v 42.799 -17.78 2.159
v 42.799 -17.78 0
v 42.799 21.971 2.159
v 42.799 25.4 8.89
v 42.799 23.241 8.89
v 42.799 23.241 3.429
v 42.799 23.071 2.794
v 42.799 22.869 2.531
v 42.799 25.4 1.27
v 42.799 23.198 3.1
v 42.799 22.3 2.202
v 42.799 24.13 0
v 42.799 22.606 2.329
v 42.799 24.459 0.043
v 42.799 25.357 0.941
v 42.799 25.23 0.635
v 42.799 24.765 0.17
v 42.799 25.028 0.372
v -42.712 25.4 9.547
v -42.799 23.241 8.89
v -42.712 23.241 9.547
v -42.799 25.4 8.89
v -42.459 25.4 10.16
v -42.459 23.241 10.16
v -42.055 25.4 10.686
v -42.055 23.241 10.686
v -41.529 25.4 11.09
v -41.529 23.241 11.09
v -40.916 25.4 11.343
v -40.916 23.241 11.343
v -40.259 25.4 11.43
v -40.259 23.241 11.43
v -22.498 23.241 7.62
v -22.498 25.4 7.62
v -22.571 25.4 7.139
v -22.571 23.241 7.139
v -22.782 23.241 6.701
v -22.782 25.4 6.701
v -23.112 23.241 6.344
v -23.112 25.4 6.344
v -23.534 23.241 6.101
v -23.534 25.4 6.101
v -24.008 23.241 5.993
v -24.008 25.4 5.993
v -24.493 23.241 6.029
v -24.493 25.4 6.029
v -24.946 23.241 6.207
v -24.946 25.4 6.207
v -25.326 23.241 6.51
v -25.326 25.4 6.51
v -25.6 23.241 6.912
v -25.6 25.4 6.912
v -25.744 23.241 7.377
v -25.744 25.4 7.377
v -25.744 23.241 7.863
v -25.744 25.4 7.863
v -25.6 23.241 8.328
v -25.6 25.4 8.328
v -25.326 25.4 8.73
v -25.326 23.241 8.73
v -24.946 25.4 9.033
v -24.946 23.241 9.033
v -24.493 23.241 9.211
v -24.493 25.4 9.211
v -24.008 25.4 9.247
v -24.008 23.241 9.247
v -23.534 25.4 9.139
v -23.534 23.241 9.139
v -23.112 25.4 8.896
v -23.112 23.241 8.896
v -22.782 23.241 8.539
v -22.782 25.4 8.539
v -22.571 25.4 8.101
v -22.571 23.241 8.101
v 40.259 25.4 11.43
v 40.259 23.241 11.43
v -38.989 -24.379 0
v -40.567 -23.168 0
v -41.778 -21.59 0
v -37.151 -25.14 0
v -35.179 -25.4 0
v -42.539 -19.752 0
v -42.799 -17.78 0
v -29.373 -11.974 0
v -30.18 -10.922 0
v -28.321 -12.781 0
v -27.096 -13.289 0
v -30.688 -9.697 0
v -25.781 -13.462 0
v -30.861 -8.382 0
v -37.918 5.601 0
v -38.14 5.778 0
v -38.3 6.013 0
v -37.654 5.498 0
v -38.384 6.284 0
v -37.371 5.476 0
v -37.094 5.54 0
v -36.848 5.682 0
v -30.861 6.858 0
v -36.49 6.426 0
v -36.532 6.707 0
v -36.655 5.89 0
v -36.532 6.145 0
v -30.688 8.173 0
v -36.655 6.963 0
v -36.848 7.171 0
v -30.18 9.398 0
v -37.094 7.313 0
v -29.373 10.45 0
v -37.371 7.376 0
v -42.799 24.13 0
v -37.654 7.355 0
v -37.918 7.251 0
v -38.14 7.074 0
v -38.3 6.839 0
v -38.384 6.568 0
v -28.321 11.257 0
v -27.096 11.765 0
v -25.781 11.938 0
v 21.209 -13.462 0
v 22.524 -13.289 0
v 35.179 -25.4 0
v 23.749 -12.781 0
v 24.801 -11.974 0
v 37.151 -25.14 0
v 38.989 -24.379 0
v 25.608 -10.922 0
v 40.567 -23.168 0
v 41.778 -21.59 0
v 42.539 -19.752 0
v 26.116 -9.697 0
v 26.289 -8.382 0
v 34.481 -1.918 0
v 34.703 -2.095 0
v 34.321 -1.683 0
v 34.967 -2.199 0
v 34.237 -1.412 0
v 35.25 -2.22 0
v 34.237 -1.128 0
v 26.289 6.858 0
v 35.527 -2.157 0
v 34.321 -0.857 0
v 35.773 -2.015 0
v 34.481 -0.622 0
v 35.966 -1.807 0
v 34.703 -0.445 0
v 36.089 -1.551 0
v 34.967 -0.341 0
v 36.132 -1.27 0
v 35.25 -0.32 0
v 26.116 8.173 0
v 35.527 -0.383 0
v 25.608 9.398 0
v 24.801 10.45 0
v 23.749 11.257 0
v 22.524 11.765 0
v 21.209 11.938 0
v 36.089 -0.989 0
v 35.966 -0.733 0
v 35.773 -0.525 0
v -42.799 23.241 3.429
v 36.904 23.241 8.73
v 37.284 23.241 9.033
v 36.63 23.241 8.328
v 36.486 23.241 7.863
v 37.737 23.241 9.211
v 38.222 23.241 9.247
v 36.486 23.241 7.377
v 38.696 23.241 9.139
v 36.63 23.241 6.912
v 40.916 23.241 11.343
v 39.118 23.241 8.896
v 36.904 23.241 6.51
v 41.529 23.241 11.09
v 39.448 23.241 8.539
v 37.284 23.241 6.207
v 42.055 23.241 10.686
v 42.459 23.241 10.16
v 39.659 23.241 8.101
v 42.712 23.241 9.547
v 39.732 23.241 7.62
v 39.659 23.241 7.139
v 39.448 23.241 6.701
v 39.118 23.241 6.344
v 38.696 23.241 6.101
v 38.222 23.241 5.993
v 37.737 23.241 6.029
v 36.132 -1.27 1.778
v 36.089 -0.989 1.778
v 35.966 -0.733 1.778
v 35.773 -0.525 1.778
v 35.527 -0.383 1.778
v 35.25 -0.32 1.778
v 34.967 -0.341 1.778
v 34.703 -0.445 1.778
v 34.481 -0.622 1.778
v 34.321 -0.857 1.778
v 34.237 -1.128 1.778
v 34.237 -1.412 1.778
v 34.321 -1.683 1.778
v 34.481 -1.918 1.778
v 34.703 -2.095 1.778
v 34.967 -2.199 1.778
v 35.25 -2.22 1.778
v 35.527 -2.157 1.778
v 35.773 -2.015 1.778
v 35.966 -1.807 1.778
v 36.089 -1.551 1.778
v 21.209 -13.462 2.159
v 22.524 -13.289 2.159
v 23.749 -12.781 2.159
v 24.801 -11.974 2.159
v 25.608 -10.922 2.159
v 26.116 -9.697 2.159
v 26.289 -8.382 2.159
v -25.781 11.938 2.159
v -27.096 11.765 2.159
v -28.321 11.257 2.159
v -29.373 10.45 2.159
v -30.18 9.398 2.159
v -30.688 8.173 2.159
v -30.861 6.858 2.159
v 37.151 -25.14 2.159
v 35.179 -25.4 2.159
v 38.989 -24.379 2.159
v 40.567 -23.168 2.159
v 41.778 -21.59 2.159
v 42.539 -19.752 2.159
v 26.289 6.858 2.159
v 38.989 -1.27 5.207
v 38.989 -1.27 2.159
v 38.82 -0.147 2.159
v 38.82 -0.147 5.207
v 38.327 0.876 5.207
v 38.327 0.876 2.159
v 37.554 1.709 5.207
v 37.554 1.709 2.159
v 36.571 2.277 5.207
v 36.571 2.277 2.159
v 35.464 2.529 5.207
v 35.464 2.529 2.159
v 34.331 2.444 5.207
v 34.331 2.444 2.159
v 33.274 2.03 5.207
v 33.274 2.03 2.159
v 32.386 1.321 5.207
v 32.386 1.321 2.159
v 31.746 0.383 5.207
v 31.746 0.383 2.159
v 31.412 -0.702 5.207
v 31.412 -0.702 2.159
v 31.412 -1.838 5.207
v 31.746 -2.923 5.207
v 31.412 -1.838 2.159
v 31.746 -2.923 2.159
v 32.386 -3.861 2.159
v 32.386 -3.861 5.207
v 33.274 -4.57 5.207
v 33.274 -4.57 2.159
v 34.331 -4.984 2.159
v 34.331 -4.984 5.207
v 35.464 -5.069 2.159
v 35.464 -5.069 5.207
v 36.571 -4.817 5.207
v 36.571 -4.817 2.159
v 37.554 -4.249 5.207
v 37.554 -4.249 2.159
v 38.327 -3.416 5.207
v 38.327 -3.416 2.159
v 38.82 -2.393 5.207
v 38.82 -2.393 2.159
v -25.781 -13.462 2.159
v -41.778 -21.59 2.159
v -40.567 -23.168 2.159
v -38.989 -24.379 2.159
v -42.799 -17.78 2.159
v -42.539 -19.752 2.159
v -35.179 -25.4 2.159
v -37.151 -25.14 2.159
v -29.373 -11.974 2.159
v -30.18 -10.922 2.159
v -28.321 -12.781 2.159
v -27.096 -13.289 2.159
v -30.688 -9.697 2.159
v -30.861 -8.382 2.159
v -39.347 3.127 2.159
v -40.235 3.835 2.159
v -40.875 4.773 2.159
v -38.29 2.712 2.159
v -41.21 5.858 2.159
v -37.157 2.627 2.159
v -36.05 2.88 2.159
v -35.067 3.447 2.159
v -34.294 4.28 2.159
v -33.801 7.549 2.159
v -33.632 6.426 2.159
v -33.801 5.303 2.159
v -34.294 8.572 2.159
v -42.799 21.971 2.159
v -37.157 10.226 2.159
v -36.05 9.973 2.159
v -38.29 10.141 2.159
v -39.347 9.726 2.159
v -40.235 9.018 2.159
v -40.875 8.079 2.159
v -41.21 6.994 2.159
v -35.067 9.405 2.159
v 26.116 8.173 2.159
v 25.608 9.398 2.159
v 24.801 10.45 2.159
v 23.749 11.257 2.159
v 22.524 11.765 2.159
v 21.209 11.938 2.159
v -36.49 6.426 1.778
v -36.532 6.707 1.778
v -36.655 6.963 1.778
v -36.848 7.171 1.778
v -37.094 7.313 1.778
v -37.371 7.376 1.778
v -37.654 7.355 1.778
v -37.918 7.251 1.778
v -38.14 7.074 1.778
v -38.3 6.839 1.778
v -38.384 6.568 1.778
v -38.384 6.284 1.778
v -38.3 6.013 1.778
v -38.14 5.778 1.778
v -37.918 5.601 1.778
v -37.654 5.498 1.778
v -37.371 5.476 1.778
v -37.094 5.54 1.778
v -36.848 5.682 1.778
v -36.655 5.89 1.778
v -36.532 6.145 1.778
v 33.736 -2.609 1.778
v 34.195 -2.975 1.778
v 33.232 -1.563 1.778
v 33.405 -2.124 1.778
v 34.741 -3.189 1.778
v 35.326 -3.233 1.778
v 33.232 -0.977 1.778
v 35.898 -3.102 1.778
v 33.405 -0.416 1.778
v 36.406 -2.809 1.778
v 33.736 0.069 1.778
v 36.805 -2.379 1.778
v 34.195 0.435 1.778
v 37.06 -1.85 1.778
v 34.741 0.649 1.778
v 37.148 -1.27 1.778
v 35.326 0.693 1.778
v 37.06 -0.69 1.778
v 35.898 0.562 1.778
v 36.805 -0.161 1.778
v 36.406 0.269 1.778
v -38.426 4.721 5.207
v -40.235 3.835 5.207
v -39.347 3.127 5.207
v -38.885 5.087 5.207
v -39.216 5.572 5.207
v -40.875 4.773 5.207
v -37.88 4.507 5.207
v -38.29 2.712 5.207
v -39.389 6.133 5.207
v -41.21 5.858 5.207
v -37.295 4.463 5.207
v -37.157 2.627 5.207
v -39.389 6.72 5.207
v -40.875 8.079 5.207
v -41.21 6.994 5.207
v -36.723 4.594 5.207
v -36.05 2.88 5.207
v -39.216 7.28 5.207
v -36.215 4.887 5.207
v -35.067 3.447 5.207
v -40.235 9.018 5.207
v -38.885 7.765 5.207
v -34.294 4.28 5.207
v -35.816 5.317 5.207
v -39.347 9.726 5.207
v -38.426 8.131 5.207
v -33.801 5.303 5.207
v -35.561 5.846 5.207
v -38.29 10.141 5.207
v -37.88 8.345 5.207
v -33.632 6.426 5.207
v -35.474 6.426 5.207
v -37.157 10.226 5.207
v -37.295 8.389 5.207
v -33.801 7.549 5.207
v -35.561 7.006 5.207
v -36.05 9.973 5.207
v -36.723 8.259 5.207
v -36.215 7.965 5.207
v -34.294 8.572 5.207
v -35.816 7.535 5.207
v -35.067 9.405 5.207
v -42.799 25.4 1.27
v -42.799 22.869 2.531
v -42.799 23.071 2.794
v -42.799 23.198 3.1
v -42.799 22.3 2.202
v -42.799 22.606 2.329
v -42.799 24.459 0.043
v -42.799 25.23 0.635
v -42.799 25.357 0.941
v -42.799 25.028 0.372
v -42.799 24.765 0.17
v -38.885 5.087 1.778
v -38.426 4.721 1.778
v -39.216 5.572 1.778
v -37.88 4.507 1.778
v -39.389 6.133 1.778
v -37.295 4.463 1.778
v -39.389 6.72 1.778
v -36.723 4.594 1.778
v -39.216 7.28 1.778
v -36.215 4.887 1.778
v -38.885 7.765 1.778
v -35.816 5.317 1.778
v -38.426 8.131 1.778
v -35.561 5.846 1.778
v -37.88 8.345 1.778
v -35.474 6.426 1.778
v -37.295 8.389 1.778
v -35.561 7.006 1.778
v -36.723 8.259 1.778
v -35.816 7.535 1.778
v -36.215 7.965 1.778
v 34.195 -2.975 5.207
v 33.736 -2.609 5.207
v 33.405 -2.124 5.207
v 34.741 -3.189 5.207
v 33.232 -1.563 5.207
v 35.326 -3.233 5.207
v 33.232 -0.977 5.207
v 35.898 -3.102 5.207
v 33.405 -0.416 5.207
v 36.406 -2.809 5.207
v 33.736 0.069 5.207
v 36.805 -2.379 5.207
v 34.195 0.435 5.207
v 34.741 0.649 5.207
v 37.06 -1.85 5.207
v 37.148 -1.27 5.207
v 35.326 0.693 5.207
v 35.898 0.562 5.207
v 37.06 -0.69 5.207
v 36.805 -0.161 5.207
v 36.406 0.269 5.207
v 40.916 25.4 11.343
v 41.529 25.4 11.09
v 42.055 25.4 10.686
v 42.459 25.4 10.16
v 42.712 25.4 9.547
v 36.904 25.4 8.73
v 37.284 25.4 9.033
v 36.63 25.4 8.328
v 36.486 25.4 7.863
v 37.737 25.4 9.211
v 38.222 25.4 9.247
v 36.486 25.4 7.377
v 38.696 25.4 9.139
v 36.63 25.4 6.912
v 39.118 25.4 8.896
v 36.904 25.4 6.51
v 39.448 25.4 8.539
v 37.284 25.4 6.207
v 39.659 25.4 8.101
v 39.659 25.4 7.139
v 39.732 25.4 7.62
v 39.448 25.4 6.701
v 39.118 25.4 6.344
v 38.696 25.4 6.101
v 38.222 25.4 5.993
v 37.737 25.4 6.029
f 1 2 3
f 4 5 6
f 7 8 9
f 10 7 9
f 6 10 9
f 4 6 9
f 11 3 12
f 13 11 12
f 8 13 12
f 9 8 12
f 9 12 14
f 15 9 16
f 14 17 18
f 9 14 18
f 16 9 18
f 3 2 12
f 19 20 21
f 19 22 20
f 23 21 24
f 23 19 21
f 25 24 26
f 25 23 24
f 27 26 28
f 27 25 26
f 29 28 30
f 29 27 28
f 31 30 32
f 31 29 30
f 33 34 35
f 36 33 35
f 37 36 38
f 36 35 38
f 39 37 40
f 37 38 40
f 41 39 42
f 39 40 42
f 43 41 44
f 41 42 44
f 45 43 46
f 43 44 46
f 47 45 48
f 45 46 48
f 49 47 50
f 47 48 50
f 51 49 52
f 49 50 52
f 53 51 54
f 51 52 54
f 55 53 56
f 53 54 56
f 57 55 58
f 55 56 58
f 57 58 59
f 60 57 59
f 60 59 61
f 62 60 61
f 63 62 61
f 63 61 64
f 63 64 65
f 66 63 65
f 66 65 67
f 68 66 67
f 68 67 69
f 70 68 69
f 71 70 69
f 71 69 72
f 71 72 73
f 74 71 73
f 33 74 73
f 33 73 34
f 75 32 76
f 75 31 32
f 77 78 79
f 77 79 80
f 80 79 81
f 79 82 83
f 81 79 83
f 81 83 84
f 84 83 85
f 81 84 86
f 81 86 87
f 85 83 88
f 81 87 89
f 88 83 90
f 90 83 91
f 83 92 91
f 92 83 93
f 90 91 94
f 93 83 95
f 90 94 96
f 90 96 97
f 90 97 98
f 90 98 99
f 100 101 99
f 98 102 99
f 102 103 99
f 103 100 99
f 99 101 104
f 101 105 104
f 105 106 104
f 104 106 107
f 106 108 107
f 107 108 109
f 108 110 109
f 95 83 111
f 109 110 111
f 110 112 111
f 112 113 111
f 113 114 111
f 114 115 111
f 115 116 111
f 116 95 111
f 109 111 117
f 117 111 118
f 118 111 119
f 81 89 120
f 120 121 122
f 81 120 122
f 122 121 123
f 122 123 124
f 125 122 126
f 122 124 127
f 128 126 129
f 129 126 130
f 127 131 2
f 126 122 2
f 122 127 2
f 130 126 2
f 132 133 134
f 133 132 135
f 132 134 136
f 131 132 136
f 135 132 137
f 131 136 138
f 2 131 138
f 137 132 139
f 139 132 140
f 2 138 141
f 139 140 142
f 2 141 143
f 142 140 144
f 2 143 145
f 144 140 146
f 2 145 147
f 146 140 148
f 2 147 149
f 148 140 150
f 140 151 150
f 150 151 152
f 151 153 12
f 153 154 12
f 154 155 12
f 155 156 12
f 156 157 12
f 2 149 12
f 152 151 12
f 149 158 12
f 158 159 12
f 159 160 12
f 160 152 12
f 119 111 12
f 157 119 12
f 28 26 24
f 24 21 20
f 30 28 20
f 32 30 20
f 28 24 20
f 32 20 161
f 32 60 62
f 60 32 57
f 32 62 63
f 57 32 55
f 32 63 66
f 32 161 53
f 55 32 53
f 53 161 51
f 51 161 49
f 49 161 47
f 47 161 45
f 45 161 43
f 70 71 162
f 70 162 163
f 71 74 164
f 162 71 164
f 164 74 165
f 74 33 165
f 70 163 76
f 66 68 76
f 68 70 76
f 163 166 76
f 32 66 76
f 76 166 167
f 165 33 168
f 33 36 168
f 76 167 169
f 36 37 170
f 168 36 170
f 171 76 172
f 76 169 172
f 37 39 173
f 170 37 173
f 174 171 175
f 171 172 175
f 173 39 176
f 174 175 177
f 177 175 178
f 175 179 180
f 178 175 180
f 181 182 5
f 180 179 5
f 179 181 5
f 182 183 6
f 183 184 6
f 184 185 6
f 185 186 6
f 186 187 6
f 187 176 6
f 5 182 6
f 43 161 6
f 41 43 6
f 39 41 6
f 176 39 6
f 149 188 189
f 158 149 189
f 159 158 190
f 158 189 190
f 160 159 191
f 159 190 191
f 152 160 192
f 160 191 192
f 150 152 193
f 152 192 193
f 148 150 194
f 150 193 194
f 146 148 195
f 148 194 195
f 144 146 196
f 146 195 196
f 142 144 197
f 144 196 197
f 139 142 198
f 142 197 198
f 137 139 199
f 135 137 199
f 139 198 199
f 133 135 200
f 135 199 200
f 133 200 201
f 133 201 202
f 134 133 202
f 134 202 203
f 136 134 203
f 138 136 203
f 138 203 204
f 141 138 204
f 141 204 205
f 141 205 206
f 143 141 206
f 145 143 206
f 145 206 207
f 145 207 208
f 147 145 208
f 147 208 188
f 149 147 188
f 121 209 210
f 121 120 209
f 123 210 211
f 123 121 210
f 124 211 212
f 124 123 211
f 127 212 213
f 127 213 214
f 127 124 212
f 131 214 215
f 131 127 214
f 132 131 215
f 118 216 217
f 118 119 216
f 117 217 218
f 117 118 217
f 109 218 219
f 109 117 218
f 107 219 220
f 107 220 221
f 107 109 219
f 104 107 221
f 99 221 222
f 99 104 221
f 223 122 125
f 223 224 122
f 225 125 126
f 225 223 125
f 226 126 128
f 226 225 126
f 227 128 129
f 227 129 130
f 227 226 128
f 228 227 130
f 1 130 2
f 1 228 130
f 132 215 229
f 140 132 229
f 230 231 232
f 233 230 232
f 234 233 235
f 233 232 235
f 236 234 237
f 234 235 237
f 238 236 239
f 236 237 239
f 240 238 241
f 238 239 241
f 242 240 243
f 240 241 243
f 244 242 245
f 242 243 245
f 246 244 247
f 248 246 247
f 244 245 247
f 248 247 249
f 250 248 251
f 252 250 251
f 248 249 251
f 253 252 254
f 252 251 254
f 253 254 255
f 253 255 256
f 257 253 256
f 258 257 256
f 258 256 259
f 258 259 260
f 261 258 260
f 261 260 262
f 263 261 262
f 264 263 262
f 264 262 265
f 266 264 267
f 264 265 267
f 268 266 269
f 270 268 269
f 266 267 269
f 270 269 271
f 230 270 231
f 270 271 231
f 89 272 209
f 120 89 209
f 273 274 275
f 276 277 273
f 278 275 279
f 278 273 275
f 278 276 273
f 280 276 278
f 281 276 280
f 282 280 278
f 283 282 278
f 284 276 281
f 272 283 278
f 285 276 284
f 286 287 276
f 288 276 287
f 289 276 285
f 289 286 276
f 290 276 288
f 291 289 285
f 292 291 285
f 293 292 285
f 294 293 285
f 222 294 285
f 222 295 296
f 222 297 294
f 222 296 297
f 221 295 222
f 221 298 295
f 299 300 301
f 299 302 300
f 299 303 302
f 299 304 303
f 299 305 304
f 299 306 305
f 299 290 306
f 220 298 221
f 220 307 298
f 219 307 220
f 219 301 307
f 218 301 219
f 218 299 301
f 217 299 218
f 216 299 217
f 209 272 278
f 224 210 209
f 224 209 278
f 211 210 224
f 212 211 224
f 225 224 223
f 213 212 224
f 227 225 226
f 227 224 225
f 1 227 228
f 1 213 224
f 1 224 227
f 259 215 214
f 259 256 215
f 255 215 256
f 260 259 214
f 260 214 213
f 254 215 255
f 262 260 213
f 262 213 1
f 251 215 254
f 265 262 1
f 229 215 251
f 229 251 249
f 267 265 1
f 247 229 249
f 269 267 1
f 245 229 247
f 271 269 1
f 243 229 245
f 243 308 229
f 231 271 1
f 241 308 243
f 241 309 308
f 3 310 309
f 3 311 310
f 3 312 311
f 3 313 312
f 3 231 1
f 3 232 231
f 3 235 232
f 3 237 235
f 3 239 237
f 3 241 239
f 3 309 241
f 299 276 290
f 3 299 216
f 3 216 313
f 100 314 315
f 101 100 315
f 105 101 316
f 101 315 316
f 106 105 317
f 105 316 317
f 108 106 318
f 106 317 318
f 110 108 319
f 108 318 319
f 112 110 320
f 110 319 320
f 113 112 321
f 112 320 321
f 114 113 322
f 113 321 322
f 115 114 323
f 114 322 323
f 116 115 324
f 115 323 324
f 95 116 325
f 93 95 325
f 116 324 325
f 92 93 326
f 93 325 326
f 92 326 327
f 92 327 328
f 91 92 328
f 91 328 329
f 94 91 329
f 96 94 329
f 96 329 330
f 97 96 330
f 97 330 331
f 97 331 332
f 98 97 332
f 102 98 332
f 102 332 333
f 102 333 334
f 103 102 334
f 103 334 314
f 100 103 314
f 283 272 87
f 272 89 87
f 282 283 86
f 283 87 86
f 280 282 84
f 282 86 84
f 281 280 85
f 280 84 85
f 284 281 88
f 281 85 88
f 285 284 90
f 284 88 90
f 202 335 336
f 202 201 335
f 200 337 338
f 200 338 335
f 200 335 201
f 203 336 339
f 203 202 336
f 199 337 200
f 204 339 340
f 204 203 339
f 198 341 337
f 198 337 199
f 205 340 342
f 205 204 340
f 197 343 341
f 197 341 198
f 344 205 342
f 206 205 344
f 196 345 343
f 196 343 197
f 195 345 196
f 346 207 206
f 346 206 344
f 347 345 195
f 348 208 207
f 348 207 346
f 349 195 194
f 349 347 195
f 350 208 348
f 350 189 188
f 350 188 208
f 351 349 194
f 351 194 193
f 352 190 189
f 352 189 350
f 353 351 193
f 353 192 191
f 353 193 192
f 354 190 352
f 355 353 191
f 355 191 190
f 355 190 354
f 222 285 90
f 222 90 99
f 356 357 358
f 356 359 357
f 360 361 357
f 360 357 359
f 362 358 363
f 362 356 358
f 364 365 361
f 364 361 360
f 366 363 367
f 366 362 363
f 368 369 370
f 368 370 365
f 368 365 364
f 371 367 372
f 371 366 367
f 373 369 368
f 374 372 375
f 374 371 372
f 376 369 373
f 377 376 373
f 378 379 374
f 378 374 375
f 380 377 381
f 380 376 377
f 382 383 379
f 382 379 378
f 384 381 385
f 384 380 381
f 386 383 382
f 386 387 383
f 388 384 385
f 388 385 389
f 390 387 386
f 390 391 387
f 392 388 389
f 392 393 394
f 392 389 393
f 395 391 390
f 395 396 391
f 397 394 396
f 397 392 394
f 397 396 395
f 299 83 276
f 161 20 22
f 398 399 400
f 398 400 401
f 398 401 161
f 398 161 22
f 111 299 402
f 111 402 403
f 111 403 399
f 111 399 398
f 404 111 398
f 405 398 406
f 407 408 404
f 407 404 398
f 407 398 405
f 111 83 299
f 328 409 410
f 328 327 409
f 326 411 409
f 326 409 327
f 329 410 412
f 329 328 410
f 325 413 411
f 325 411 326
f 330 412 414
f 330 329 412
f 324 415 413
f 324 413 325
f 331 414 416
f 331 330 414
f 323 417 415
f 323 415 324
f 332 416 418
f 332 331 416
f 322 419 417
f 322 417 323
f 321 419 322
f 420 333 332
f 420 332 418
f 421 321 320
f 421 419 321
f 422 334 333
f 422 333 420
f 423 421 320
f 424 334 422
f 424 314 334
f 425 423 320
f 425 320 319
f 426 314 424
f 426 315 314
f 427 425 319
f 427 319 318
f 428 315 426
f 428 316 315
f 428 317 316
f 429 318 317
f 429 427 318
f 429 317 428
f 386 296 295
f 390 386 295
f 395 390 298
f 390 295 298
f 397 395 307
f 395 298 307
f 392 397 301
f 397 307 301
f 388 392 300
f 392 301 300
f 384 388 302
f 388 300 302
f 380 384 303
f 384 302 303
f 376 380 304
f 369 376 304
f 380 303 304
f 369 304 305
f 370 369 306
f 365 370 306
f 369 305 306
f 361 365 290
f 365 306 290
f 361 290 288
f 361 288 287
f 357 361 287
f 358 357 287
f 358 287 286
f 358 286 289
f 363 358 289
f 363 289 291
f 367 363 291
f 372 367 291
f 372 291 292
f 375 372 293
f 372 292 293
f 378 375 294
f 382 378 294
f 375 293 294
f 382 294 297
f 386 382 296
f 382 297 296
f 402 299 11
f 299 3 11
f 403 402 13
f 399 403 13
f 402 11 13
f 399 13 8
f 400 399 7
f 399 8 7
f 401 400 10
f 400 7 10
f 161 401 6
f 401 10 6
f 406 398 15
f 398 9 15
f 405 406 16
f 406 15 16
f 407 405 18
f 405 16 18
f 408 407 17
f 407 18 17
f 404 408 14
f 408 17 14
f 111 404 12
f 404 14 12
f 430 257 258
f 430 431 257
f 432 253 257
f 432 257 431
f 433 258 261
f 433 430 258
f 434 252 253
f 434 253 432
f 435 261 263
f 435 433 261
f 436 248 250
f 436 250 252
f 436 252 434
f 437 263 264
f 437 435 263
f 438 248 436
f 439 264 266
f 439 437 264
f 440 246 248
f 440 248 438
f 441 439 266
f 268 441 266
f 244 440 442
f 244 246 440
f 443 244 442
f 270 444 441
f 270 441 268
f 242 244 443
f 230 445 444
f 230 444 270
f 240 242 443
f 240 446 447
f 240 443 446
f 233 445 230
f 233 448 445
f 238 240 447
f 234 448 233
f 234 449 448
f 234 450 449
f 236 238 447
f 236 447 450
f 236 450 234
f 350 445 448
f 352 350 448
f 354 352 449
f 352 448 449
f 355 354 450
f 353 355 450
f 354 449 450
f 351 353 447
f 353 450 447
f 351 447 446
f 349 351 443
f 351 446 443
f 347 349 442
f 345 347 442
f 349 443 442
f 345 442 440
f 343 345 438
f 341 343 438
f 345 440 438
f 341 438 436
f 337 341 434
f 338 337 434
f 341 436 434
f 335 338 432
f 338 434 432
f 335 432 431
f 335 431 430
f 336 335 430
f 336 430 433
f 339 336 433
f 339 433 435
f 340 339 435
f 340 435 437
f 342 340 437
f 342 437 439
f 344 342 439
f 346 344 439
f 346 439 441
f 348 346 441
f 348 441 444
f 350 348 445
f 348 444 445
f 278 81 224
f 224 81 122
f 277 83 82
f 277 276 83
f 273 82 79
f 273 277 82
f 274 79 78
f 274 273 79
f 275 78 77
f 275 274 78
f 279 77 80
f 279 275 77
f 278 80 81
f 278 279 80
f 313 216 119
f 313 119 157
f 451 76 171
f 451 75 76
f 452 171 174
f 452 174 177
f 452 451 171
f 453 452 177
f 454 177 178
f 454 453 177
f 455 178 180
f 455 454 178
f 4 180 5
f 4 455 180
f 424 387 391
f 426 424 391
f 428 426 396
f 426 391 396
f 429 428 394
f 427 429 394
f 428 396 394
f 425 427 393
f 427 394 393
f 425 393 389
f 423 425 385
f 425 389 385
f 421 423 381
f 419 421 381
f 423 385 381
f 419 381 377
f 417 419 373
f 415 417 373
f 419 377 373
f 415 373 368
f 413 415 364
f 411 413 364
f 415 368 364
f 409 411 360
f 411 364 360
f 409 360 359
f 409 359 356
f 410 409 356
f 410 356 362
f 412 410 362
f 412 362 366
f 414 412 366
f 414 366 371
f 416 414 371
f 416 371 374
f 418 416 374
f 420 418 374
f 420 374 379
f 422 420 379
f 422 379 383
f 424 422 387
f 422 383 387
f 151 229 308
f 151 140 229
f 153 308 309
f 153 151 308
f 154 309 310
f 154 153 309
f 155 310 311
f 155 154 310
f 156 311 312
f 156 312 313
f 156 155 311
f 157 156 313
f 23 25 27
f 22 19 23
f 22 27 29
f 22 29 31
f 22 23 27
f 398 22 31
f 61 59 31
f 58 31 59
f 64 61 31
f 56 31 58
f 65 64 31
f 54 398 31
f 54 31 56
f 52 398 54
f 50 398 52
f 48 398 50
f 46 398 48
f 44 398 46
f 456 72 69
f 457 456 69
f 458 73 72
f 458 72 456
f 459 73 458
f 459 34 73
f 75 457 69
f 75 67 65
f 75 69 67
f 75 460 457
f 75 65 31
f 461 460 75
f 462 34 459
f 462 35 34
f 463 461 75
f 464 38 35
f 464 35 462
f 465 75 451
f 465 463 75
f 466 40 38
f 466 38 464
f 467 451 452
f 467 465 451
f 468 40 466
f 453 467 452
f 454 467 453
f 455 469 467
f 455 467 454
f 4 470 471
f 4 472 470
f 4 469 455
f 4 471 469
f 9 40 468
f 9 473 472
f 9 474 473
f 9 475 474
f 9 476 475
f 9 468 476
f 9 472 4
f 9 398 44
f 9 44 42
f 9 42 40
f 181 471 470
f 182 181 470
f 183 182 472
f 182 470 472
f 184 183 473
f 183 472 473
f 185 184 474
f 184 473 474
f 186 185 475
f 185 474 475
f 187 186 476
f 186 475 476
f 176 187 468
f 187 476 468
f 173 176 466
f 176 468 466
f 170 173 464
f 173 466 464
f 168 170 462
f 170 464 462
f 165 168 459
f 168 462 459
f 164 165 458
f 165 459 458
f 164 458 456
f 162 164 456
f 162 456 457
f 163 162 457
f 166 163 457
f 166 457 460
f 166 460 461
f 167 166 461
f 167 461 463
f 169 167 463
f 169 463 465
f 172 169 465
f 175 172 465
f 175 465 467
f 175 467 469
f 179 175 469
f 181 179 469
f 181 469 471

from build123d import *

# Parameters (mm, degrees)
SKETCH1_W             = 85.598
SKETCH1_H             = 50.8
BOSS_EXTRUDE1_DEPTH   = 2.159
SKETCH2_W             = 85.598
SKETCH2_H             = 2.159
BOSS_EXTRUDE2_DEPTH   = 9.271
FILLET1_R             = 1.27
FILLET2_R             = 1.27
FILLET3_R             = 2.54
FILLET4_R             = 7.62
SKETCH3_W             = 57.15
SKETCH3_H             = 25.4
CUT_EXTRUDE1_DEPTH    = 3.159
FILLET5_R             = 5.08
F_4_CLEARANCE_HOLE1_D = 3.2639
SKETCH6_R             = 3.81
BOSS_EXTRUDE3_DEPTH   = 3.048
SKETCH8_R             = 1.9685
CUT_EXTRUDE2_DEPTH    = 3.429
SKETCH9_R             = 0.9525
CUT_EXTRUDE3_DEPTH    = 2.778


with BuildPart() as part:
    # Sketch1 → Boss-Extrude1 (new body)
    with BuildSketch(Plane.XY):
        Rectangle(SKETCH1_W, SKETCH1_H)
    extrude(amount=BOSS_EXTRUDE1_DEPTH)

    # Sketch2 → Boss-Extrude2 (add)
    with BuildSketch(Plane.XY.offset(2.159)):
        with Locations((0, 24.3205)):
            Rectangle(SKETCH2_W, SKETCH2_H)
    extrude(amount=BOSS_EXTRUDE2_DEPTH)

    # Fillet1
    fillet1_edges = [part.edges().sort_by_distance(p)[0] for p in [
        (0, 23.241, 2.159),
    ]]
    fillet(fillet1_edges, radius=FILLET1_R)

    # Fillet2
    fillet2_edges = [part.edges().sort_by_distance(p)[0] for p in [
        (0, 25.4, 0),
    ]]
    fillet(fillet2_edges, radius=FILLET2_R)

    # Fillet3
    fillet3_edges = [part.edges().sort_by_distance(p)[0] for p in [
        (42.799, 24.3205, 11.43),
        (-42.799, 24.3205, 11.43),
    ]]
    fillet(fillet3_edges, radius=FILLET3_R)

    # Fillet4
    fillet4_edges = [part.edges().sort_by_distance(p)[0] for p in [
        (42.799, -25.4, 1.0795),
        (-42.799, -25.4, 1.0795),
    ]]
    fillet(fillet4_edges, radius=FILLET4_R)

    # Sketch3 → Cut-Extrude1 (cut, through all)
    with BuildSketch(Plane.XY.offset(2.159)):
        with Locations((-2.286, -0.762)):
            Rectangle(SKETCH3_W, SKETCH3_H)
    extrude(amount=-CUT_EXTRUDE1_DEPTH, mode=Mode.SUBTRACT)

    # Fillet5
    fillet5_edges = [part.edges().sort_by_distance(p)[0] for p in [
        (-30.861, -13.462, 1.0795),
        (-30.861, 11.938, 1.0795),
        (26.289, 11.938, 1.0795),
        (26.289, -13.462, 1.0795),
    ]]
    fillet(fillet5_edges, radius=FILLET5_R)

    # #4 Clearance Hole1 (through all)
    with Locations(Plane(origin=(0, 23.241, 0), x_dir=(-1, 0, 0), z_dir=(0, -1, 0))):
        with Locations((-38.1, -7.62), (24.13, -7.62)):
            Hole(F_4_CLEARANCE_HOLE1_D / 2)

    # Sketch6 → Boss-Extrude3 (add)
    with BuildSketch(Plane.XY.offset(2.159)):
        with Locations((35.179, -1.27)):
            Circle(SKETCH6_R)
        with Locations((-37.44214, 6.4262)):
            Circle(SKETCH6_R)
    extrude(amount=BOSS_EXTRUDE3_DEPTH)

    # Sketch8 → Cut-Extrude2 (cut)
    with BuildSketch(Plane.XY.offset(5.207)):
        with Locations((-37.44214, 6.4262)):
            Circle(SKETCH8_R)
        with Locations((35.179, -1.27)):
            Circle(SKETCH8_R)
    extrude(amount=-CUT_EXTRUDE2_DEPTH, mode=Mode.SUBTRACT)

    # Sketch9 → Cut-Extrude3 (cut, through all)
    with BuildSketch(Plane.XY.offset(1.778)):
        with Locations((-37.44214, 6.4262)):
            Circle(SKETCH9_R)
        with Locations((35.179, -1.27)):
            Circle(SKETCH9_R)
    extrude(amount=-CUT_EXTRUDE3_DEPTH, mode=Mode.SUBTRACT)


solid = part.part
